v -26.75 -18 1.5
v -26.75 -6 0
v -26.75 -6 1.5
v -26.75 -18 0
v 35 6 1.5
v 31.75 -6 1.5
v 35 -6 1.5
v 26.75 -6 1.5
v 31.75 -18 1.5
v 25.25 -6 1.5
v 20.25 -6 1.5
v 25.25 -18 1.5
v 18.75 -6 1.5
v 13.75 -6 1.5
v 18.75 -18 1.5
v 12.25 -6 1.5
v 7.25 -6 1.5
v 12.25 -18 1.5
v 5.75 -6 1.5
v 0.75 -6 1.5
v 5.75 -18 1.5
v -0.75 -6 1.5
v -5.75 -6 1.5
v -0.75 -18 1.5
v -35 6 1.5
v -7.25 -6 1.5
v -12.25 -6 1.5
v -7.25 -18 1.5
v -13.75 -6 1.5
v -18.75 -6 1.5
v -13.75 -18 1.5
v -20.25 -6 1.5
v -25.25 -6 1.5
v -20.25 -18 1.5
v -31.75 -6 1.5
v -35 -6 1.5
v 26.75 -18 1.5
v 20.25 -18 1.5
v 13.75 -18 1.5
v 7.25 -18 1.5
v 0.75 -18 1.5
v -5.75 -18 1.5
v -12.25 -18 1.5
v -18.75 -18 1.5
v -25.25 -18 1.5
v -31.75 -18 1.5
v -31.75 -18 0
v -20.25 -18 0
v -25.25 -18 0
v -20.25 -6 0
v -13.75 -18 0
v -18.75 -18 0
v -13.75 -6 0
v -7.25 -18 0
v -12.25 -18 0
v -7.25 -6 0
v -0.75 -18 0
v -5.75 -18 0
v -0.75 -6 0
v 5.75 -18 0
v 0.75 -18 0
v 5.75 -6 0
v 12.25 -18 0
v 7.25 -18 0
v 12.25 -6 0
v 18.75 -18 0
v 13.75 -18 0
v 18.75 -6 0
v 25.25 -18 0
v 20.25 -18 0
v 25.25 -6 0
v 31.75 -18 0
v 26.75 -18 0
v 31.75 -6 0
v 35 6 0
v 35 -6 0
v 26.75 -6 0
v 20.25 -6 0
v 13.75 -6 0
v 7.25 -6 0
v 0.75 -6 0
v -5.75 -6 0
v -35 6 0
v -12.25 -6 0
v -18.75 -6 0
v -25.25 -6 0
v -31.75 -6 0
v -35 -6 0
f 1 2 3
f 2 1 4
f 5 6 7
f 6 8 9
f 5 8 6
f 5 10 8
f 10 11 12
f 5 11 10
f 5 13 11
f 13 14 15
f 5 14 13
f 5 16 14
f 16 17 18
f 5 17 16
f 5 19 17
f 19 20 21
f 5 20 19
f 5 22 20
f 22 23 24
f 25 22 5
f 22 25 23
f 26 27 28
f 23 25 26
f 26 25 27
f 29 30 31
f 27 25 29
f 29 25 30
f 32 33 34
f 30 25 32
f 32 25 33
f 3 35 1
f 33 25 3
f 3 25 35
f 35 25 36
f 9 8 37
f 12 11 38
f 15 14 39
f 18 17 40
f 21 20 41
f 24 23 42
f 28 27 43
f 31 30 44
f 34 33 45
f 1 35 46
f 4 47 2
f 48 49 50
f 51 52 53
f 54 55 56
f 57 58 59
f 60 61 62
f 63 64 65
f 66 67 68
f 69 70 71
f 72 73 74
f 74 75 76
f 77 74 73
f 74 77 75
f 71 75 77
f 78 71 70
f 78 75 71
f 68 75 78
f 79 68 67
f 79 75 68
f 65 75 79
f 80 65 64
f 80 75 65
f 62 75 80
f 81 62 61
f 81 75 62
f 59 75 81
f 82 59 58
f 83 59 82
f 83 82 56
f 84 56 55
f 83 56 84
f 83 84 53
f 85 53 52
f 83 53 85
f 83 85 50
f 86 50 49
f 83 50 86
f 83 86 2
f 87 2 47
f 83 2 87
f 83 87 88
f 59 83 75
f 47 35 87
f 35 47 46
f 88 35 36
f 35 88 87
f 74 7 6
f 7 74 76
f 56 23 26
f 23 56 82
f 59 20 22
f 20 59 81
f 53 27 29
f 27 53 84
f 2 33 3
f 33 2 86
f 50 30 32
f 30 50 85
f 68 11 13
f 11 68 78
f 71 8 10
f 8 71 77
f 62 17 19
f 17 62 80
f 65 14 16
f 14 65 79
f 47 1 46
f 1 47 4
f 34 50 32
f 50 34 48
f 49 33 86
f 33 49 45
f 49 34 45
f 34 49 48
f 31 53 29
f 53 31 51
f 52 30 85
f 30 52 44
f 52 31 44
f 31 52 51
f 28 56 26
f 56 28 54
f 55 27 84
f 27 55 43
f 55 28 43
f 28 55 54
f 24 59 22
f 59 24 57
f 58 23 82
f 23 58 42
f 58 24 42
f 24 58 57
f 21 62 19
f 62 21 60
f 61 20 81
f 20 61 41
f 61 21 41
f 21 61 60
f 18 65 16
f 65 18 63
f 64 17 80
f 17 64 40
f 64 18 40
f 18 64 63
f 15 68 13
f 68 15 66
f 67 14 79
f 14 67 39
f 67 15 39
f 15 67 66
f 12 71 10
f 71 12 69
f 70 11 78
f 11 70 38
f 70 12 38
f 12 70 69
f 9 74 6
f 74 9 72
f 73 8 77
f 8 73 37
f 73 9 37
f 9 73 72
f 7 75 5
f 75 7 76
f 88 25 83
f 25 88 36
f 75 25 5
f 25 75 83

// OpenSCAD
// Dimensions
spine_length_x = 70;      // Spine length in X (mm)
spine_width_y = 12;       // Spine width in Y (mm)
tooth_width_x = 5.0;      // Tooth width in X (mm)
tooth_length_y = 12;      // Tooth length in Y (mm)
gap_width = 1.5;          // Gap between teeth in X (mm)
plate_thickness_z = 1.5;  // Overall thickness in Z (mm)
num_teeth = 10;           // Number of teeth

$fn = 64;

// Calculate total width of teeth row
total_teeth_width = num_teeth * tooth_width_x + (num_teeth - 1) * gap_width;

// Calculate starting X position for first tooth (centered)
teeth_start_x = -total_teeth_width / 2;

translate([0, 0, plate_thickness_z / 2]) {
  // Main spine
  cube([spine_length_x, spine_width_y, plate_thickness_z], center = true);
  
  // Create all teeth
  for (i = [0:num_teeth-1]) {
    tooth_x_center = teeth_start_x + i * (tooth_width_x + gap_width) + tooth_width_x / 2;
    tooth_y_center = -spine_width_y / 2 - tooth_length_y / 2;
    
    translate([tooth_x_center, tooth_y_center, 0])
      cube([tooth_width_x, tooth_length_y, plate_thickness_z], center = true);
  }
}
